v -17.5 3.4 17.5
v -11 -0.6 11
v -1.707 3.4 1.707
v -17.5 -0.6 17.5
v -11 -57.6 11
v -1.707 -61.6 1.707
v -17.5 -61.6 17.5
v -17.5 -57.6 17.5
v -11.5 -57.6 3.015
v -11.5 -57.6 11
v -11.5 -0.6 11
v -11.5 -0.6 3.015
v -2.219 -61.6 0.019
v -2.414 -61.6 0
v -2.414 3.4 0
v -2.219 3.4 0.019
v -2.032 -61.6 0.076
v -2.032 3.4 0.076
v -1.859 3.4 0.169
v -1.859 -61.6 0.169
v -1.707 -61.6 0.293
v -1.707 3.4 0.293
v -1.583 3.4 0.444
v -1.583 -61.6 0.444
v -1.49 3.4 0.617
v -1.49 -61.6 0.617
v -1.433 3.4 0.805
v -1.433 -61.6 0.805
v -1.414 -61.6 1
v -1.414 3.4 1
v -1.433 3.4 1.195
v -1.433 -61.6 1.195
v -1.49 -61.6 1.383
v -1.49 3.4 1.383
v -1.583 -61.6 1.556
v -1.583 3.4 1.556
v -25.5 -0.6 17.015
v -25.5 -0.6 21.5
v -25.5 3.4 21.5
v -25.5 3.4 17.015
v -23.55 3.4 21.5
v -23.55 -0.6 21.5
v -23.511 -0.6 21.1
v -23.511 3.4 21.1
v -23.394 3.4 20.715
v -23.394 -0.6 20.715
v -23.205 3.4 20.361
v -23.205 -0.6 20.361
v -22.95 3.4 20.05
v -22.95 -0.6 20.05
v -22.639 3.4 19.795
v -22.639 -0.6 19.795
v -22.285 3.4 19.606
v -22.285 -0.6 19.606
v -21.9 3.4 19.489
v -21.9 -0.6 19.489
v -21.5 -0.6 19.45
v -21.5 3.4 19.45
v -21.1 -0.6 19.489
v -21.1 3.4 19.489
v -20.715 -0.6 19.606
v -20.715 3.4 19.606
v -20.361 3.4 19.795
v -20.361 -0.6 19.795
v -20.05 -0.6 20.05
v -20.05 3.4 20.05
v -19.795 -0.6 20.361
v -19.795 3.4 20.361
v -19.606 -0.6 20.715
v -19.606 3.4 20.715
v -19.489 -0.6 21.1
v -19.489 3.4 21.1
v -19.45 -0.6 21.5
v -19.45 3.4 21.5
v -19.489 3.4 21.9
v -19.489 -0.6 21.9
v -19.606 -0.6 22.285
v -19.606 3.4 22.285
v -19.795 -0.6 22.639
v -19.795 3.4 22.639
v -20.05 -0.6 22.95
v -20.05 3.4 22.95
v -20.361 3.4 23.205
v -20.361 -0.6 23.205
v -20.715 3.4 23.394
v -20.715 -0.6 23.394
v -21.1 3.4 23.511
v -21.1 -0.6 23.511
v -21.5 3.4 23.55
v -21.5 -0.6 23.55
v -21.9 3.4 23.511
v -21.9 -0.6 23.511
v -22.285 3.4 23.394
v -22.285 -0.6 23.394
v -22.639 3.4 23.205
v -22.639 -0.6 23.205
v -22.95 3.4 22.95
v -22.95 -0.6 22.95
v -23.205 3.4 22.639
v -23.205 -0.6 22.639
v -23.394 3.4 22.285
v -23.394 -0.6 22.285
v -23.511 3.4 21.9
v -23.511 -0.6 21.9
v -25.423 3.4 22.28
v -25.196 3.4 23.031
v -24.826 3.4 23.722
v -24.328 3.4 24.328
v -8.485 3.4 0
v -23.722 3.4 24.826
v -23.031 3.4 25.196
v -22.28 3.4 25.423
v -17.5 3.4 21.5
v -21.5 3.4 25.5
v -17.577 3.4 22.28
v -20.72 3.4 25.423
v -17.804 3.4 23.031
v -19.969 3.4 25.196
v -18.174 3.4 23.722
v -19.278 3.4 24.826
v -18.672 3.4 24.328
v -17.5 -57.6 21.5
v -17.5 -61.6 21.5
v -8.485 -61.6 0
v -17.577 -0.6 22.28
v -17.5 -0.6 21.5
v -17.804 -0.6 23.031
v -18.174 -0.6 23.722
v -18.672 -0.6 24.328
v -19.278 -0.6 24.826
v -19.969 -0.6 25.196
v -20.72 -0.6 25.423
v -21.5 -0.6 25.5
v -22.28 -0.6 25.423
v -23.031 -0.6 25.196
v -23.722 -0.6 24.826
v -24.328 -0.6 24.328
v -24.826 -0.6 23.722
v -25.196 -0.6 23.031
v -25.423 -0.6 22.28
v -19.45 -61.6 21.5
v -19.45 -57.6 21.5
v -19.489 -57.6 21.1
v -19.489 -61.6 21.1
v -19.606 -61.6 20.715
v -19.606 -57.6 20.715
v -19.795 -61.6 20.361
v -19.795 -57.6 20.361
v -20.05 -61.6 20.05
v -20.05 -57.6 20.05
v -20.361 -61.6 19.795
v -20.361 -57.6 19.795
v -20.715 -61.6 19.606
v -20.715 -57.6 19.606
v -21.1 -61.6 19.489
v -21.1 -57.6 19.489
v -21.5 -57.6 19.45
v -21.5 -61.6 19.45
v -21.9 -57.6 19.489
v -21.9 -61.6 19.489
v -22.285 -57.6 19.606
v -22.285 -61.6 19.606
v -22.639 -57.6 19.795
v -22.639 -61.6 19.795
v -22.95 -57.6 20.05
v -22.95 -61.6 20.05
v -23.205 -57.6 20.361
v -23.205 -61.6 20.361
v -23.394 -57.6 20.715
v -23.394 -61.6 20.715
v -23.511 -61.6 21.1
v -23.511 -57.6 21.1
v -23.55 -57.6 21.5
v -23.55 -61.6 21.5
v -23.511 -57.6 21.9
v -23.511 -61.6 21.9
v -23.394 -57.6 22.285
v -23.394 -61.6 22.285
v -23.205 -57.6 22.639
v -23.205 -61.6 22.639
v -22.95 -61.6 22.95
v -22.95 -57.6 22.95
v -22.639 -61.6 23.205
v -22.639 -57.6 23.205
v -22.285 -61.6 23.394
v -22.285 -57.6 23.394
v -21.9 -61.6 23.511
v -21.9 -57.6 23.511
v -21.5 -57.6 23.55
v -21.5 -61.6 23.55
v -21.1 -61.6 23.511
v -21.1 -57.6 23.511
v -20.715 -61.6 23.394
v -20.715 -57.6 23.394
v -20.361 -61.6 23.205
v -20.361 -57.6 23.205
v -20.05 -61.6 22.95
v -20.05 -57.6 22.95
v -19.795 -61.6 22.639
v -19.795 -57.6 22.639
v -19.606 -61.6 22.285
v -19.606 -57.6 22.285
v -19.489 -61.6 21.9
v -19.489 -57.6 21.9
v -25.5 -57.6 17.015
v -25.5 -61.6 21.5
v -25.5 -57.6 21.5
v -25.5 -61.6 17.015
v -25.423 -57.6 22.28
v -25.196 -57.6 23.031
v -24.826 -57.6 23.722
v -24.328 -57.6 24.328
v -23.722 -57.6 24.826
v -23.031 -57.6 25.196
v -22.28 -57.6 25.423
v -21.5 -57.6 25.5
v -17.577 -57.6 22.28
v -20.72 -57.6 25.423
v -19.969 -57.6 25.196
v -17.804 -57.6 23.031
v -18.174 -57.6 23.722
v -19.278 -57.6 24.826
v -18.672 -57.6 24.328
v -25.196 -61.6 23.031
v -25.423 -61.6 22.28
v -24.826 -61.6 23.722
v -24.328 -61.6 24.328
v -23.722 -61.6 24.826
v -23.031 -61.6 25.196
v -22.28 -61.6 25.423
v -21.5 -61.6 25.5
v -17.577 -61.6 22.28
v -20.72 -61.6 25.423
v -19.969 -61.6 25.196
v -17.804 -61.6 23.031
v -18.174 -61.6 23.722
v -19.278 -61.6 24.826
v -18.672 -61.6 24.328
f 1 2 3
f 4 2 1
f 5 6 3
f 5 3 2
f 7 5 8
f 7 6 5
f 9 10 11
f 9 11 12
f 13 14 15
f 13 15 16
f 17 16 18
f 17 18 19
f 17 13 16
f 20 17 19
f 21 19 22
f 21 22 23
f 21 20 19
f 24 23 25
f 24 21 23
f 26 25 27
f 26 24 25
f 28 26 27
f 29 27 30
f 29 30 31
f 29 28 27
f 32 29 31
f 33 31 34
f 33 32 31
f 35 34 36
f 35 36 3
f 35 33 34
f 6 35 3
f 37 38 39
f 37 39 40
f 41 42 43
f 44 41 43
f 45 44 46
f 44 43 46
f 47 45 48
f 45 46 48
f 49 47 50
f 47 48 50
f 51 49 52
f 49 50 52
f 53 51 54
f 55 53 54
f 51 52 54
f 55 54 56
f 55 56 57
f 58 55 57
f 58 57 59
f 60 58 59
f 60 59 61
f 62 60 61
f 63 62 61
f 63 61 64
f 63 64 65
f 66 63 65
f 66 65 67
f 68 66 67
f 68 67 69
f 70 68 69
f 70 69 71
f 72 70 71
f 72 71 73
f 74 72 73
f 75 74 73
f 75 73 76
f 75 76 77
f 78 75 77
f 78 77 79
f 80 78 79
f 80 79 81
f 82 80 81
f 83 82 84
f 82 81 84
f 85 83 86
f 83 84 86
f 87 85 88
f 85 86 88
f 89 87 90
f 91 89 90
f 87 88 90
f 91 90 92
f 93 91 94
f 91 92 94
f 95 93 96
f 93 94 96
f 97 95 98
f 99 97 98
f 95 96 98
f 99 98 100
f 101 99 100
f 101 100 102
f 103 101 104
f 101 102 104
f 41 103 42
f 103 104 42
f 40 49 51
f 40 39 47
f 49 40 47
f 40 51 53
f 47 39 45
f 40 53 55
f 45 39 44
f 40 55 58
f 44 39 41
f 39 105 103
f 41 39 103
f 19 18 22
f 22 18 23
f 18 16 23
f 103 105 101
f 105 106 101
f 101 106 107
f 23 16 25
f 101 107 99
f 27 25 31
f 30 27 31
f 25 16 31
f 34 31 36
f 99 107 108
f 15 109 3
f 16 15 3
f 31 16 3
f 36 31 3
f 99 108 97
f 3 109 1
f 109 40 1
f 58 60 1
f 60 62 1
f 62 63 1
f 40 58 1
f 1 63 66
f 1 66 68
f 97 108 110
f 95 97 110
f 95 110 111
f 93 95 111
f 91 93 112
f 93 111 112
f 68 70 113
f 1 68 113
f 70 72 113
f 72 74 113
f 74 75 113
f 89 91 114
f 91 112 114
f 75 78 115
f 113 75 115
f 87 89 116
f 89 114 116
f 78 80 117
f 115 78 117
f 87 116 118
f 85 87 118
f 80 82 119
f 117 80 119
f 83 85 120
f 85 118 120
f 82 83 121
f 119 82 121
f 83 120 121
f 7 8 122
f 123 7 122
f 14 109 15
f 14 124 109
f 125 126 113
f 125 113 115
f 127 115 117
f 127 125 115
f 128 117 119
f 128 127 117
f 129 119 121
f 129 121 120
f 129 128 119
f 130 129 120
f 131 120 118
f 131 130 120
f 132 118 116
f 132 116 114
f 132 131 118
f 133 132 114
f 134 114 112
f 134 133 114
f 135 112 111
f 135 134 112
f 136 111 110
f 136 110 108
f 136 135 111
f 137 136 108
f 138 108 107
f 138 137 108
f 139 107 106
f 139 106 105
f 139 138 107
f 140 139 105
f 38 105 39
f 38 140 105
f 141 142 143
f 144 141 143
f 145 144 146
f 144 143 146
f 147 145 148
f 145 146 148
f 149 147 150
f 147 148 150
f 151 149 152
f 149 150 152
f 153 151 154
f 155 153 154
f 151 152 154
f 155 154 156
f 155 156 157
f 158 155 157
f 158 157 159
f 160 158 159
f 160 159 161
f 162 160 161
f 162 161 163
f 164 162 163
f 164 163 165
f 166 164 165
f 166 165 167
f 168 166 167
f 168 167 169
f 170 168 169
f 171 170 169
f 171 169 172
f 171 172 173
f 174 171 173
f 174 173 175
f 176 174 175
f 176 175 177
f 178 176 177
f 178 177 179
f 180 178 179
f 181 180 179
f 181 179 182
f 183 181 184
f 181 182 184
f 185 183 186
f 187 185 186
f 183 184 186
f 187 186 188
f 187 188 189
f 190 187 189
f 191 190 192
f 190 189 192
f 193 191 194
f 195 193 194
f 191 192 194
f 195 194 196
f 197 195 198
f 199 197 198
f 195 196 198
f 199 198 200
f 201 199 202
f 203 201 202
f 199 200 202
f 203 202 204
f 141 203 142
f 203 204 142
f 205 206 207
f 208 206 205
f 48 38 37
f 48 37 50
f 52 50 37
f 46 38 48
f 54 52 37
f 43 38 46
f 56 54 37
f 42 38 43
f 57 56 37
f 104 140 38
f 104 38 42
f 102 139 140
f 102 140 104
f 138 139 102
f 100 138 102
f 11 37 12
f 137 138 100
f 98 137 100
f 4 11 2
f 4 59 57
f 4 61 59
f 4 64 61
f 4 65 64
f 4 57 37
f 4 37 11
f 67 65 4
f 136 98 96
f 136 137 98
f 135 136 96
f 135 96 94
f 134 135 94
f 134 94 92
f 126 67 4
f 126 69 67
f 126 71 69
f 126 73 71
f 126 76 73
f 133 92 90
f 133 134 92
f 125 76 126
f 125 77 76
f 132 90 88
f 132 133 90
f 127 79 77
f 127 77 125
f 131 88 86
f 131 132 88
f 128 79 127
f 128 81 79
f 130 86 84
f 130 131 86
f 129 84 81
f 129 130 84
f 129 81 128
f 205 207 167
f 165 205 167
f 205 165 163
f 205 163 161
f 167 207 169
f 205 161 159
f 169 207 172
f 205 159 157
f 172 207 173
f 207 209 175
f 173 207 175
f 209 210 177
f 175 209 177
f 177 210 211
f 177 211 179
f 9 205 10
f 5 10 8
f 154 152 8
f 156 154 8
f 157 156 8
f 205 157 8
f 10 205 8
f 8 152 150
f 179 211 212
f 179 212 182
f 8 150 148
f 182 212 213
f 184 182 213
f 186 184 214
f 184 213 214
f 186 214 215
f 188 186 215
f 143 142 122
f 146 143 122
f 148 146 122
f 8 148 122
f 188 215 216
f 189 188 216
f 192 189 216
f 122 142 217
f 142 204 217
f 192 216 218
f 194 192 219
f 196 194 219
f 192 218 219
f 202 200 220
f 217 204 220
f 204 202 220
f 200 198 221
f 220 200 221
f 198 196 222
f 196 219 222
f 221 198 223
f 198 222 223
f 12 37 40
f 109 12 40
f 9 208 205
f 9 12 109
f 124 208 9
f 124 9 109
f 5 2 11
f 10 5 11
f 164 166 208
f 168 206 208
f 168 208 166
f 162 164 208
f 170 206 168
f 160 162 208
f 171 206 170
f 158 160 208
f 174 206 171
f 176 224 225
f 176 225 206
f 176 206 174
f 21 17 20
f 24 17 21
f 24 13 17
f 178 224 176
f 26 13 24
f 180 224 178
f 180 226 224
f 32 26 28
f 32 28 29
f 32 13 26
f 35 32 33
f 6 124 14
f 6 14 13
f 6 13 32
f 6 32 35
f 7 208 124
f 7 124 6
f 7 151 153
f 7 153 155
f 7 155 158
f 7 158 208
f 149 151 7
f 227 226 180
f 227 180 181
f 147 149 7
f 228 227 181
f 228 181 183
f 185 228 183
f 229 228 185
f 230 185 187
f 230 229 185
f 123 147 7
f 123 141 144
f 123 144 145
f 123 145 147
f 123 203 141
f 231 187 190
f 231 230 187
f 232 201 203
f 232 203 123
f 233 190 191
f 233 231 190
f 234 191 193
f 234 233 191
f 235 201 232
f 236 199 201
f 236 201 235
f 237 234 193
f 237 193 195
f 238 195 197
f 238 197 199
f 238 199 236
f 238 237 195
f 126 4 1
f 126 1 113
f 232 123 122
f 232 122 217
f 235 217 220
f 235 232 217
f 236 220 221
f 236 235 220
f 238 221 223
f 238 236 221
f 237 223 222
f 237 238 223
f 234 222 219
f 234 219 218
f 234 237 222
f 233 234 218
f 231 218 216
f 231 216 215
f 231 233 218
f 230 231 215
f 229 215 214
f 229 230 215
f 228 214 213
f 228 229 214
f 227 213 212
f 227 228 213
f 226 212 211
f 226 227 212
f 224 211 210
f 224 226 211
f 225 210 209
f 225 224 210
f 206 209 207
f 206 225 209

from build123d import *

# Parameters (mm, degrees)
BOSS_EXTRUDE1_DEPTH            = 4.00000003
BOSS_EXTRUDE2_DEPTH            = 56.99999997
BOSS_EXTRUDE3_DEPTH            = 4
F_4_1_4_1_DIAMETER_HOLE1_D     = 4.1
F_4_1_4_1_DIAMETER_HOLE1_DEPTH = 4
F_4_1_4_1_DIAMETER_HOLE2_D     = 4.1
F_4_1_4_1_DIAMETER_HOLE2_DEPTH = 65


with BuildPart() as part:
    # Sketch1 → Boss-Extrude1 (new body)
    with BuildSketch(Plane.XZ.offset(61.6)):
        with BuildLine():
            Line((-25.5, 17.014718626), (-8.485281374, 0))
            Line((-8.485281374, 0), (-2.414213562, 0))
            ThreePointArc((-2.414213562, 0), (-1.49033403, 0.617316568), (-1.707106781, 1.707106781))
            Line((-1.707106781, 1.707106781), (-17.5, 17.5))
            Line((-17.5, 17.5), (-17.5, 21.5))
            ThreePointArc((-17.5, 21.5), (-21.5, 25.5), (-25.5, 21.5))
            Line((-25.5, 21.5), (-25.5, 17.014718626))
        make_face()
    extrude(amount=-BOSS_EXTRUDE1_DEPTH)

    # Sketch2 → Boss-Extrude2 (add)
    with BuildSketch(Plane(origin=(0, -57.59999997, 0), x_dir=(-1, 0, 0), z_dir=(0, 1, 0))):
        with BuildLine():
            Line((1.707106781, 1.707106781), (11.000000003, 11.000000003))
            Line((11.000000003, 11.000000003), (11.500000002, 11.000000003))
            Line((11.500000002, 11.000000003), (11.500000002, 3.014718628))
            Line((11.500000002, 3.014718628), (8.485281374, 0))
            Line((8.485281374, 0), (2.414213562, 0))
            ThreePointArc((2.414213562, 0), (1.49033403, 0.617316568), (1.707106781, 1.707106781))
        make_face()
    extrude(amount=BOSS_EXTRUDE2_DEPTH)

    # Sketch3 → Boss-Extrude3 (add)
    with BuildSketch(Plane(origin=(0, -0.6, 0), x_dir=(-1, 0, 0), z_dir=(0, 1, 0))):
        with BuildLine():
            Line((8.485281374, 0), (2.414213562, 0))
            ThreePointArc((2.414213562, 0), (1.49033403, 0.617316568), (1.707106781, 1.707106781))
            Line((1.707106781, 1.707106781), (17.500000001, 17.500000001))
            Line((17.500000001, 17.500000001), (17.500000001, 21.5))
            ThreePointArc((17.500000001, 21.5), (21.500000001, 25.5), (25.5, 21.5))
            Line((25.5, 21.5), (25.5, 17.014718626))
            Line((25.5, 17.014718626), (8.485281374, 0))
        make_face()
    extrude(amount=BOSS_EXTRUDE3_DEPTH)

    # Ø4.1 (4.1) Diameter Hole1
    with Locations(Plane(origin=(0, 3.4, 0), x_dir=(1, 0, 0), z_dir=(0, 1, 0))):
        with Locations((-21.5, -21.5)):
            Hole(F_4_1_4_1_DIAMETER_HOLE1_D / 2, depth=F_4_1_4_1_DIAMETER_HOLE1_DEPTH)

    # Ø4.1 (4.1) Diameter Hole2
    with Locations(Plane(origin=(0, -61.6, 0), x_dir=(-1, 0, 0), z_dir=(0, -1, 0))):
        with Locations((21.5, -21.5)):
            Hole(F_4_1_4_1_DIAMETER_HOLE2_D / 2, depth=F_4_1_4_1_DIAMETER_HOLE2_DEPTH)


solid = part.part
